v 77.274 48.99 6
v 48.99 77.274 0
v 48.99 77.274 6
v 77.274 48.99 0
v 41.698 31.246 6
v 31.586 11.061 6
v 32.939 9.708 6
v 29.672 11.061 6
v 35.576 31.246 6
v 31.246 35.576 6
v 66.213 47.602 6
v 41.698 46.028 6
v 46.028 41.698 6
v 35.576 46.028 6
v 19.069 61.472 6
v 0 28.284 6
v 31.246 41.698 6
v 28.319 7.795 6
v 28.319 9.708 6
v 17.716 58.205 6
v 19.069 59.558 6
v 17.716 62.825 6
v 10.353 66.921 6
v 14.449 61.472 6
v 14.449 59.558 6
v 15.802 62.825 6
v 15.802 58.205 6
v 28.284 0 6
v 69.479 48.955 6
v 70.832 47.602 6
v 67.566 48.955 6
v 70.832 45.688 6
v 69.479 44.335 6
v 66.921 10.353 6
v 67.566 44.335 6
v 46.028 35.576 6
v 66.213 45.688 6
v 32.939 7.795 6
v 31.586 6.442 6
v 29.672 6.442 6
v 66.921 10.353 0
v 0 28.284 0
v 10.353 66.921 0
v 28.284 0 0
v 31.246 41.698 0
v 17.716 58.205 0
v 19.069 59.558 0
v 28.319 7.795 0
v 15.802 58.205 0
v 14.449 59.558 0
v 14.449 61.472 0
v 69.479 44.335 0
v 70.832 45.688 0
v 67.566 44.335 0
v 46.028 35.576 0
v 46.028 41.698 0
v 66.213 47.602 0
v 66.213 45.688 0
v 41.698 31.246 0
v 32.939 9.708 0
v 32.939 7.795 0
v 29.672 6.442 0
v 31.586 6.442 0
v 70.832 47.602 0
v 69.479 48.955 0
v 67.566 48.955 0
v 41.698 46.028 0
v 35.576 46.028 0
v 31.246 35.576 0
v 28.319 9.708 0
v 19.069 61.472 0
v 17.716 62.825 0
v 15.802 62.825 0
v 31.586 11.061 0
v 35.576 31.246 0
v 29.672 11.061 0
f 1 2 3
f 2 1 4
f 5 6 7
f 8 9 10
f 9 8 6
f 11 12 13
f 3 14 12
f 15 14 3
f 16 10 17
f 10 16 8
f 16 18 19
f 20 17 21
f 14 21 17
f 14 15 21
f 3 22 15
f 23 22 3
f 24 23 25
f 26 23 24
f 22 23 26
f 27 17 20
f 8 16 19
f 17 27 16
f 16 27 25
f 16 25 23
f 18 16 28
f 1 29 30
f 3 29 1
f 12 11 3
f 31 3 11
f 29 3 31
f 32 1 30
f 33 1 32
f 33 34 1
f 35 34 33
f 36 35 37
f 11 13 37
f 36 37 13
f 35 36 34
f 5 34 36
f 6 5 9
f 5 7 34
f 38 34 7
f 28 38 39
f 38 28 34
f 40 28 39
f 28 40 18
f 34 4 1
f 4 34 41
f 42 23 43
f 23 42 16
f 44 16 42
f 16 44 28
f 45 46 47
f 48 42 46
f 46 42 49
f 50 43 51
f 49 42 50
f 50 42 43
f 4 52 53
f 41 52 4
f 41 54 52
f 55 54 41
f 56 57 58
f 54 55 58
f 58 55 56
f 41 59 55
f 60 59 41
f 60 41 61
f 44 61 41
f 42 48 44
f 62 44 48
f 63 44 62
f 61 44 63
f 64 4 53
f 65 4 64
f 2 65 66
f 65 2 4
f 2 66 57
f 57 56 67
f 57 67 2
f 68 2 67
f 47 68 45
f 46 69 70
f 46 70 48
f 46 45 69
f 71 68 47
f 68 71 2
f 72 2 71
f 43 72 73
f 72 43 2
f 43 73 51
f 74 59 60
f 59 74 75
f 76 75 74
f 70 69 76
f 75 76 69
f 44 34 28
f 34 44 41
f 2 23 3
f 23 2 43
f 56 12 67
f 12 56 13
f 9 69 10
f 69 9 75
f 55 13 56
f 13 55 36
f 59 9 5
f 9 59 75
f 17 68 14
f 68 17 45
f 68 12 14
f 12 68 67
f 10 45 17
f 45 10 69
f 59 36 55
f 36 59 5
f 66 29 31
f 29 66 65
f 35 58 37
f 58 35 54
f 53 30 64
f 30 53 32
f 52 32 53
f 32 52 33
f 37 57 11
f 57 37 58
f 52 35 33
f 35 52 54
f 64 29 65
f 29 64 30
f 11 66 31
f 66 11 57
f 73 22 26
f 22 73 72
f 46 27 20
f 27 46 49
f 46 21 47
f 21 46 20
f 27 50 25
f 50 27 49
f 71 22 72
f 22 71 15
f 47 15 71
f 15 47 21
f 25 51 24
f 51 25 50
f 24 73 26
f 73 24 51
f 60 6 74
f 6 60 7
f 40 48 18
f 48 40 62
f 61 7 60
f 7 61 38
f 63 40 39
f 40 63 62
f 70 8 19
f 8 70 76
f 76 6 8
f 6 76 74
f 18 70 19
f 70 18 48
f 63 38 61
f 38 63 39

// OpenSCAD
$fn = 32;

// ----------------------------------------------------------------------
// Polygon plate: 6-gon R40, 3 bolt windows
// ----------------------------------------------------------------------

// --- parameters (mm) ---
sides = 6;                // number of polygon sides
plate_r = 40;             // circumscribed radius of the polygon
bore_r = 8;               // centre bore radius
bolts = 3;                // number of bolt windows
ring_r = 30.94;           // bolt-circle radius
bolt_r = 2.5;             // bolt window radius
plate_t = 6;              // plate thickness, Z (extrusion height)

plate_d = 2 * plate_r;  // circumscribed diameter
bore_d = 2 * bore_r;  // centre bore diameter
bolt_d = 2 * bolt_r;  // bolt window diameter
ring_d = 2 * ring_r;  // bolt-circle diameter

profile = [[77.274, 48.99], [48.99, 77.274], [10.353, 66.921], [0, 28.284], [28.284, 0], [66.921, 10.353]];  // primary outline, 6 points, counter clockwise
void_1 = [[46.028, 41.698], [41.698, 46.028], [35.576, 46.028], [31.246, 41.698], [31.246, 35.576], [35.576, 31.246], [41.698, 31.246], [46.028, 35.576]];  // centre bore, 8 points
void_2 = [[70.832, 47.602], [69.479, 48.955], [67.566, 48.955], [66.213, 47.602], [66.213, 45.688], [67.566, 44.335], [69.479, 44.335], [70.832, 45.688]];  // bolt window 1, 8 points
void_3 = [[19.069, 61.472], [17.716, 62.825], [15.802, 62.825], [14.449, 61.472], [14.449, 59.558], [15.802, 58.205], [17.716, 58.205], [19.069, 59.558]];  // bolt window 2, 8 points
void_4 = [[32.939, 9.708], [31.586, 11.061], [29.672, 11.061], [28.319, 9.708], [28.319, 7.795], [29.672, 6.442], [31.586, 6.442], [32.939, 7.795]];  // bolt window 3, 8 points

// --- the one profile operation ---
difference() {
  linear_extrude(height = plate_t) polygon(points = profile);
  translate([0, 0, -1])
    linear_extrude(height = plate_t + 2) polygon(points = void_1);
  translate([0, 0, -1])
    linear_extrude(height = plate_t + 2) polygon(points = void_2);
  translate([0, 0, -1])
    linear_extrude(height = plate_t + 2) polygon(points = void_3);
  translate([0, 0, -1])
    linear_extrude(height = plate_t + 2) polygon(points = void_4);
}
